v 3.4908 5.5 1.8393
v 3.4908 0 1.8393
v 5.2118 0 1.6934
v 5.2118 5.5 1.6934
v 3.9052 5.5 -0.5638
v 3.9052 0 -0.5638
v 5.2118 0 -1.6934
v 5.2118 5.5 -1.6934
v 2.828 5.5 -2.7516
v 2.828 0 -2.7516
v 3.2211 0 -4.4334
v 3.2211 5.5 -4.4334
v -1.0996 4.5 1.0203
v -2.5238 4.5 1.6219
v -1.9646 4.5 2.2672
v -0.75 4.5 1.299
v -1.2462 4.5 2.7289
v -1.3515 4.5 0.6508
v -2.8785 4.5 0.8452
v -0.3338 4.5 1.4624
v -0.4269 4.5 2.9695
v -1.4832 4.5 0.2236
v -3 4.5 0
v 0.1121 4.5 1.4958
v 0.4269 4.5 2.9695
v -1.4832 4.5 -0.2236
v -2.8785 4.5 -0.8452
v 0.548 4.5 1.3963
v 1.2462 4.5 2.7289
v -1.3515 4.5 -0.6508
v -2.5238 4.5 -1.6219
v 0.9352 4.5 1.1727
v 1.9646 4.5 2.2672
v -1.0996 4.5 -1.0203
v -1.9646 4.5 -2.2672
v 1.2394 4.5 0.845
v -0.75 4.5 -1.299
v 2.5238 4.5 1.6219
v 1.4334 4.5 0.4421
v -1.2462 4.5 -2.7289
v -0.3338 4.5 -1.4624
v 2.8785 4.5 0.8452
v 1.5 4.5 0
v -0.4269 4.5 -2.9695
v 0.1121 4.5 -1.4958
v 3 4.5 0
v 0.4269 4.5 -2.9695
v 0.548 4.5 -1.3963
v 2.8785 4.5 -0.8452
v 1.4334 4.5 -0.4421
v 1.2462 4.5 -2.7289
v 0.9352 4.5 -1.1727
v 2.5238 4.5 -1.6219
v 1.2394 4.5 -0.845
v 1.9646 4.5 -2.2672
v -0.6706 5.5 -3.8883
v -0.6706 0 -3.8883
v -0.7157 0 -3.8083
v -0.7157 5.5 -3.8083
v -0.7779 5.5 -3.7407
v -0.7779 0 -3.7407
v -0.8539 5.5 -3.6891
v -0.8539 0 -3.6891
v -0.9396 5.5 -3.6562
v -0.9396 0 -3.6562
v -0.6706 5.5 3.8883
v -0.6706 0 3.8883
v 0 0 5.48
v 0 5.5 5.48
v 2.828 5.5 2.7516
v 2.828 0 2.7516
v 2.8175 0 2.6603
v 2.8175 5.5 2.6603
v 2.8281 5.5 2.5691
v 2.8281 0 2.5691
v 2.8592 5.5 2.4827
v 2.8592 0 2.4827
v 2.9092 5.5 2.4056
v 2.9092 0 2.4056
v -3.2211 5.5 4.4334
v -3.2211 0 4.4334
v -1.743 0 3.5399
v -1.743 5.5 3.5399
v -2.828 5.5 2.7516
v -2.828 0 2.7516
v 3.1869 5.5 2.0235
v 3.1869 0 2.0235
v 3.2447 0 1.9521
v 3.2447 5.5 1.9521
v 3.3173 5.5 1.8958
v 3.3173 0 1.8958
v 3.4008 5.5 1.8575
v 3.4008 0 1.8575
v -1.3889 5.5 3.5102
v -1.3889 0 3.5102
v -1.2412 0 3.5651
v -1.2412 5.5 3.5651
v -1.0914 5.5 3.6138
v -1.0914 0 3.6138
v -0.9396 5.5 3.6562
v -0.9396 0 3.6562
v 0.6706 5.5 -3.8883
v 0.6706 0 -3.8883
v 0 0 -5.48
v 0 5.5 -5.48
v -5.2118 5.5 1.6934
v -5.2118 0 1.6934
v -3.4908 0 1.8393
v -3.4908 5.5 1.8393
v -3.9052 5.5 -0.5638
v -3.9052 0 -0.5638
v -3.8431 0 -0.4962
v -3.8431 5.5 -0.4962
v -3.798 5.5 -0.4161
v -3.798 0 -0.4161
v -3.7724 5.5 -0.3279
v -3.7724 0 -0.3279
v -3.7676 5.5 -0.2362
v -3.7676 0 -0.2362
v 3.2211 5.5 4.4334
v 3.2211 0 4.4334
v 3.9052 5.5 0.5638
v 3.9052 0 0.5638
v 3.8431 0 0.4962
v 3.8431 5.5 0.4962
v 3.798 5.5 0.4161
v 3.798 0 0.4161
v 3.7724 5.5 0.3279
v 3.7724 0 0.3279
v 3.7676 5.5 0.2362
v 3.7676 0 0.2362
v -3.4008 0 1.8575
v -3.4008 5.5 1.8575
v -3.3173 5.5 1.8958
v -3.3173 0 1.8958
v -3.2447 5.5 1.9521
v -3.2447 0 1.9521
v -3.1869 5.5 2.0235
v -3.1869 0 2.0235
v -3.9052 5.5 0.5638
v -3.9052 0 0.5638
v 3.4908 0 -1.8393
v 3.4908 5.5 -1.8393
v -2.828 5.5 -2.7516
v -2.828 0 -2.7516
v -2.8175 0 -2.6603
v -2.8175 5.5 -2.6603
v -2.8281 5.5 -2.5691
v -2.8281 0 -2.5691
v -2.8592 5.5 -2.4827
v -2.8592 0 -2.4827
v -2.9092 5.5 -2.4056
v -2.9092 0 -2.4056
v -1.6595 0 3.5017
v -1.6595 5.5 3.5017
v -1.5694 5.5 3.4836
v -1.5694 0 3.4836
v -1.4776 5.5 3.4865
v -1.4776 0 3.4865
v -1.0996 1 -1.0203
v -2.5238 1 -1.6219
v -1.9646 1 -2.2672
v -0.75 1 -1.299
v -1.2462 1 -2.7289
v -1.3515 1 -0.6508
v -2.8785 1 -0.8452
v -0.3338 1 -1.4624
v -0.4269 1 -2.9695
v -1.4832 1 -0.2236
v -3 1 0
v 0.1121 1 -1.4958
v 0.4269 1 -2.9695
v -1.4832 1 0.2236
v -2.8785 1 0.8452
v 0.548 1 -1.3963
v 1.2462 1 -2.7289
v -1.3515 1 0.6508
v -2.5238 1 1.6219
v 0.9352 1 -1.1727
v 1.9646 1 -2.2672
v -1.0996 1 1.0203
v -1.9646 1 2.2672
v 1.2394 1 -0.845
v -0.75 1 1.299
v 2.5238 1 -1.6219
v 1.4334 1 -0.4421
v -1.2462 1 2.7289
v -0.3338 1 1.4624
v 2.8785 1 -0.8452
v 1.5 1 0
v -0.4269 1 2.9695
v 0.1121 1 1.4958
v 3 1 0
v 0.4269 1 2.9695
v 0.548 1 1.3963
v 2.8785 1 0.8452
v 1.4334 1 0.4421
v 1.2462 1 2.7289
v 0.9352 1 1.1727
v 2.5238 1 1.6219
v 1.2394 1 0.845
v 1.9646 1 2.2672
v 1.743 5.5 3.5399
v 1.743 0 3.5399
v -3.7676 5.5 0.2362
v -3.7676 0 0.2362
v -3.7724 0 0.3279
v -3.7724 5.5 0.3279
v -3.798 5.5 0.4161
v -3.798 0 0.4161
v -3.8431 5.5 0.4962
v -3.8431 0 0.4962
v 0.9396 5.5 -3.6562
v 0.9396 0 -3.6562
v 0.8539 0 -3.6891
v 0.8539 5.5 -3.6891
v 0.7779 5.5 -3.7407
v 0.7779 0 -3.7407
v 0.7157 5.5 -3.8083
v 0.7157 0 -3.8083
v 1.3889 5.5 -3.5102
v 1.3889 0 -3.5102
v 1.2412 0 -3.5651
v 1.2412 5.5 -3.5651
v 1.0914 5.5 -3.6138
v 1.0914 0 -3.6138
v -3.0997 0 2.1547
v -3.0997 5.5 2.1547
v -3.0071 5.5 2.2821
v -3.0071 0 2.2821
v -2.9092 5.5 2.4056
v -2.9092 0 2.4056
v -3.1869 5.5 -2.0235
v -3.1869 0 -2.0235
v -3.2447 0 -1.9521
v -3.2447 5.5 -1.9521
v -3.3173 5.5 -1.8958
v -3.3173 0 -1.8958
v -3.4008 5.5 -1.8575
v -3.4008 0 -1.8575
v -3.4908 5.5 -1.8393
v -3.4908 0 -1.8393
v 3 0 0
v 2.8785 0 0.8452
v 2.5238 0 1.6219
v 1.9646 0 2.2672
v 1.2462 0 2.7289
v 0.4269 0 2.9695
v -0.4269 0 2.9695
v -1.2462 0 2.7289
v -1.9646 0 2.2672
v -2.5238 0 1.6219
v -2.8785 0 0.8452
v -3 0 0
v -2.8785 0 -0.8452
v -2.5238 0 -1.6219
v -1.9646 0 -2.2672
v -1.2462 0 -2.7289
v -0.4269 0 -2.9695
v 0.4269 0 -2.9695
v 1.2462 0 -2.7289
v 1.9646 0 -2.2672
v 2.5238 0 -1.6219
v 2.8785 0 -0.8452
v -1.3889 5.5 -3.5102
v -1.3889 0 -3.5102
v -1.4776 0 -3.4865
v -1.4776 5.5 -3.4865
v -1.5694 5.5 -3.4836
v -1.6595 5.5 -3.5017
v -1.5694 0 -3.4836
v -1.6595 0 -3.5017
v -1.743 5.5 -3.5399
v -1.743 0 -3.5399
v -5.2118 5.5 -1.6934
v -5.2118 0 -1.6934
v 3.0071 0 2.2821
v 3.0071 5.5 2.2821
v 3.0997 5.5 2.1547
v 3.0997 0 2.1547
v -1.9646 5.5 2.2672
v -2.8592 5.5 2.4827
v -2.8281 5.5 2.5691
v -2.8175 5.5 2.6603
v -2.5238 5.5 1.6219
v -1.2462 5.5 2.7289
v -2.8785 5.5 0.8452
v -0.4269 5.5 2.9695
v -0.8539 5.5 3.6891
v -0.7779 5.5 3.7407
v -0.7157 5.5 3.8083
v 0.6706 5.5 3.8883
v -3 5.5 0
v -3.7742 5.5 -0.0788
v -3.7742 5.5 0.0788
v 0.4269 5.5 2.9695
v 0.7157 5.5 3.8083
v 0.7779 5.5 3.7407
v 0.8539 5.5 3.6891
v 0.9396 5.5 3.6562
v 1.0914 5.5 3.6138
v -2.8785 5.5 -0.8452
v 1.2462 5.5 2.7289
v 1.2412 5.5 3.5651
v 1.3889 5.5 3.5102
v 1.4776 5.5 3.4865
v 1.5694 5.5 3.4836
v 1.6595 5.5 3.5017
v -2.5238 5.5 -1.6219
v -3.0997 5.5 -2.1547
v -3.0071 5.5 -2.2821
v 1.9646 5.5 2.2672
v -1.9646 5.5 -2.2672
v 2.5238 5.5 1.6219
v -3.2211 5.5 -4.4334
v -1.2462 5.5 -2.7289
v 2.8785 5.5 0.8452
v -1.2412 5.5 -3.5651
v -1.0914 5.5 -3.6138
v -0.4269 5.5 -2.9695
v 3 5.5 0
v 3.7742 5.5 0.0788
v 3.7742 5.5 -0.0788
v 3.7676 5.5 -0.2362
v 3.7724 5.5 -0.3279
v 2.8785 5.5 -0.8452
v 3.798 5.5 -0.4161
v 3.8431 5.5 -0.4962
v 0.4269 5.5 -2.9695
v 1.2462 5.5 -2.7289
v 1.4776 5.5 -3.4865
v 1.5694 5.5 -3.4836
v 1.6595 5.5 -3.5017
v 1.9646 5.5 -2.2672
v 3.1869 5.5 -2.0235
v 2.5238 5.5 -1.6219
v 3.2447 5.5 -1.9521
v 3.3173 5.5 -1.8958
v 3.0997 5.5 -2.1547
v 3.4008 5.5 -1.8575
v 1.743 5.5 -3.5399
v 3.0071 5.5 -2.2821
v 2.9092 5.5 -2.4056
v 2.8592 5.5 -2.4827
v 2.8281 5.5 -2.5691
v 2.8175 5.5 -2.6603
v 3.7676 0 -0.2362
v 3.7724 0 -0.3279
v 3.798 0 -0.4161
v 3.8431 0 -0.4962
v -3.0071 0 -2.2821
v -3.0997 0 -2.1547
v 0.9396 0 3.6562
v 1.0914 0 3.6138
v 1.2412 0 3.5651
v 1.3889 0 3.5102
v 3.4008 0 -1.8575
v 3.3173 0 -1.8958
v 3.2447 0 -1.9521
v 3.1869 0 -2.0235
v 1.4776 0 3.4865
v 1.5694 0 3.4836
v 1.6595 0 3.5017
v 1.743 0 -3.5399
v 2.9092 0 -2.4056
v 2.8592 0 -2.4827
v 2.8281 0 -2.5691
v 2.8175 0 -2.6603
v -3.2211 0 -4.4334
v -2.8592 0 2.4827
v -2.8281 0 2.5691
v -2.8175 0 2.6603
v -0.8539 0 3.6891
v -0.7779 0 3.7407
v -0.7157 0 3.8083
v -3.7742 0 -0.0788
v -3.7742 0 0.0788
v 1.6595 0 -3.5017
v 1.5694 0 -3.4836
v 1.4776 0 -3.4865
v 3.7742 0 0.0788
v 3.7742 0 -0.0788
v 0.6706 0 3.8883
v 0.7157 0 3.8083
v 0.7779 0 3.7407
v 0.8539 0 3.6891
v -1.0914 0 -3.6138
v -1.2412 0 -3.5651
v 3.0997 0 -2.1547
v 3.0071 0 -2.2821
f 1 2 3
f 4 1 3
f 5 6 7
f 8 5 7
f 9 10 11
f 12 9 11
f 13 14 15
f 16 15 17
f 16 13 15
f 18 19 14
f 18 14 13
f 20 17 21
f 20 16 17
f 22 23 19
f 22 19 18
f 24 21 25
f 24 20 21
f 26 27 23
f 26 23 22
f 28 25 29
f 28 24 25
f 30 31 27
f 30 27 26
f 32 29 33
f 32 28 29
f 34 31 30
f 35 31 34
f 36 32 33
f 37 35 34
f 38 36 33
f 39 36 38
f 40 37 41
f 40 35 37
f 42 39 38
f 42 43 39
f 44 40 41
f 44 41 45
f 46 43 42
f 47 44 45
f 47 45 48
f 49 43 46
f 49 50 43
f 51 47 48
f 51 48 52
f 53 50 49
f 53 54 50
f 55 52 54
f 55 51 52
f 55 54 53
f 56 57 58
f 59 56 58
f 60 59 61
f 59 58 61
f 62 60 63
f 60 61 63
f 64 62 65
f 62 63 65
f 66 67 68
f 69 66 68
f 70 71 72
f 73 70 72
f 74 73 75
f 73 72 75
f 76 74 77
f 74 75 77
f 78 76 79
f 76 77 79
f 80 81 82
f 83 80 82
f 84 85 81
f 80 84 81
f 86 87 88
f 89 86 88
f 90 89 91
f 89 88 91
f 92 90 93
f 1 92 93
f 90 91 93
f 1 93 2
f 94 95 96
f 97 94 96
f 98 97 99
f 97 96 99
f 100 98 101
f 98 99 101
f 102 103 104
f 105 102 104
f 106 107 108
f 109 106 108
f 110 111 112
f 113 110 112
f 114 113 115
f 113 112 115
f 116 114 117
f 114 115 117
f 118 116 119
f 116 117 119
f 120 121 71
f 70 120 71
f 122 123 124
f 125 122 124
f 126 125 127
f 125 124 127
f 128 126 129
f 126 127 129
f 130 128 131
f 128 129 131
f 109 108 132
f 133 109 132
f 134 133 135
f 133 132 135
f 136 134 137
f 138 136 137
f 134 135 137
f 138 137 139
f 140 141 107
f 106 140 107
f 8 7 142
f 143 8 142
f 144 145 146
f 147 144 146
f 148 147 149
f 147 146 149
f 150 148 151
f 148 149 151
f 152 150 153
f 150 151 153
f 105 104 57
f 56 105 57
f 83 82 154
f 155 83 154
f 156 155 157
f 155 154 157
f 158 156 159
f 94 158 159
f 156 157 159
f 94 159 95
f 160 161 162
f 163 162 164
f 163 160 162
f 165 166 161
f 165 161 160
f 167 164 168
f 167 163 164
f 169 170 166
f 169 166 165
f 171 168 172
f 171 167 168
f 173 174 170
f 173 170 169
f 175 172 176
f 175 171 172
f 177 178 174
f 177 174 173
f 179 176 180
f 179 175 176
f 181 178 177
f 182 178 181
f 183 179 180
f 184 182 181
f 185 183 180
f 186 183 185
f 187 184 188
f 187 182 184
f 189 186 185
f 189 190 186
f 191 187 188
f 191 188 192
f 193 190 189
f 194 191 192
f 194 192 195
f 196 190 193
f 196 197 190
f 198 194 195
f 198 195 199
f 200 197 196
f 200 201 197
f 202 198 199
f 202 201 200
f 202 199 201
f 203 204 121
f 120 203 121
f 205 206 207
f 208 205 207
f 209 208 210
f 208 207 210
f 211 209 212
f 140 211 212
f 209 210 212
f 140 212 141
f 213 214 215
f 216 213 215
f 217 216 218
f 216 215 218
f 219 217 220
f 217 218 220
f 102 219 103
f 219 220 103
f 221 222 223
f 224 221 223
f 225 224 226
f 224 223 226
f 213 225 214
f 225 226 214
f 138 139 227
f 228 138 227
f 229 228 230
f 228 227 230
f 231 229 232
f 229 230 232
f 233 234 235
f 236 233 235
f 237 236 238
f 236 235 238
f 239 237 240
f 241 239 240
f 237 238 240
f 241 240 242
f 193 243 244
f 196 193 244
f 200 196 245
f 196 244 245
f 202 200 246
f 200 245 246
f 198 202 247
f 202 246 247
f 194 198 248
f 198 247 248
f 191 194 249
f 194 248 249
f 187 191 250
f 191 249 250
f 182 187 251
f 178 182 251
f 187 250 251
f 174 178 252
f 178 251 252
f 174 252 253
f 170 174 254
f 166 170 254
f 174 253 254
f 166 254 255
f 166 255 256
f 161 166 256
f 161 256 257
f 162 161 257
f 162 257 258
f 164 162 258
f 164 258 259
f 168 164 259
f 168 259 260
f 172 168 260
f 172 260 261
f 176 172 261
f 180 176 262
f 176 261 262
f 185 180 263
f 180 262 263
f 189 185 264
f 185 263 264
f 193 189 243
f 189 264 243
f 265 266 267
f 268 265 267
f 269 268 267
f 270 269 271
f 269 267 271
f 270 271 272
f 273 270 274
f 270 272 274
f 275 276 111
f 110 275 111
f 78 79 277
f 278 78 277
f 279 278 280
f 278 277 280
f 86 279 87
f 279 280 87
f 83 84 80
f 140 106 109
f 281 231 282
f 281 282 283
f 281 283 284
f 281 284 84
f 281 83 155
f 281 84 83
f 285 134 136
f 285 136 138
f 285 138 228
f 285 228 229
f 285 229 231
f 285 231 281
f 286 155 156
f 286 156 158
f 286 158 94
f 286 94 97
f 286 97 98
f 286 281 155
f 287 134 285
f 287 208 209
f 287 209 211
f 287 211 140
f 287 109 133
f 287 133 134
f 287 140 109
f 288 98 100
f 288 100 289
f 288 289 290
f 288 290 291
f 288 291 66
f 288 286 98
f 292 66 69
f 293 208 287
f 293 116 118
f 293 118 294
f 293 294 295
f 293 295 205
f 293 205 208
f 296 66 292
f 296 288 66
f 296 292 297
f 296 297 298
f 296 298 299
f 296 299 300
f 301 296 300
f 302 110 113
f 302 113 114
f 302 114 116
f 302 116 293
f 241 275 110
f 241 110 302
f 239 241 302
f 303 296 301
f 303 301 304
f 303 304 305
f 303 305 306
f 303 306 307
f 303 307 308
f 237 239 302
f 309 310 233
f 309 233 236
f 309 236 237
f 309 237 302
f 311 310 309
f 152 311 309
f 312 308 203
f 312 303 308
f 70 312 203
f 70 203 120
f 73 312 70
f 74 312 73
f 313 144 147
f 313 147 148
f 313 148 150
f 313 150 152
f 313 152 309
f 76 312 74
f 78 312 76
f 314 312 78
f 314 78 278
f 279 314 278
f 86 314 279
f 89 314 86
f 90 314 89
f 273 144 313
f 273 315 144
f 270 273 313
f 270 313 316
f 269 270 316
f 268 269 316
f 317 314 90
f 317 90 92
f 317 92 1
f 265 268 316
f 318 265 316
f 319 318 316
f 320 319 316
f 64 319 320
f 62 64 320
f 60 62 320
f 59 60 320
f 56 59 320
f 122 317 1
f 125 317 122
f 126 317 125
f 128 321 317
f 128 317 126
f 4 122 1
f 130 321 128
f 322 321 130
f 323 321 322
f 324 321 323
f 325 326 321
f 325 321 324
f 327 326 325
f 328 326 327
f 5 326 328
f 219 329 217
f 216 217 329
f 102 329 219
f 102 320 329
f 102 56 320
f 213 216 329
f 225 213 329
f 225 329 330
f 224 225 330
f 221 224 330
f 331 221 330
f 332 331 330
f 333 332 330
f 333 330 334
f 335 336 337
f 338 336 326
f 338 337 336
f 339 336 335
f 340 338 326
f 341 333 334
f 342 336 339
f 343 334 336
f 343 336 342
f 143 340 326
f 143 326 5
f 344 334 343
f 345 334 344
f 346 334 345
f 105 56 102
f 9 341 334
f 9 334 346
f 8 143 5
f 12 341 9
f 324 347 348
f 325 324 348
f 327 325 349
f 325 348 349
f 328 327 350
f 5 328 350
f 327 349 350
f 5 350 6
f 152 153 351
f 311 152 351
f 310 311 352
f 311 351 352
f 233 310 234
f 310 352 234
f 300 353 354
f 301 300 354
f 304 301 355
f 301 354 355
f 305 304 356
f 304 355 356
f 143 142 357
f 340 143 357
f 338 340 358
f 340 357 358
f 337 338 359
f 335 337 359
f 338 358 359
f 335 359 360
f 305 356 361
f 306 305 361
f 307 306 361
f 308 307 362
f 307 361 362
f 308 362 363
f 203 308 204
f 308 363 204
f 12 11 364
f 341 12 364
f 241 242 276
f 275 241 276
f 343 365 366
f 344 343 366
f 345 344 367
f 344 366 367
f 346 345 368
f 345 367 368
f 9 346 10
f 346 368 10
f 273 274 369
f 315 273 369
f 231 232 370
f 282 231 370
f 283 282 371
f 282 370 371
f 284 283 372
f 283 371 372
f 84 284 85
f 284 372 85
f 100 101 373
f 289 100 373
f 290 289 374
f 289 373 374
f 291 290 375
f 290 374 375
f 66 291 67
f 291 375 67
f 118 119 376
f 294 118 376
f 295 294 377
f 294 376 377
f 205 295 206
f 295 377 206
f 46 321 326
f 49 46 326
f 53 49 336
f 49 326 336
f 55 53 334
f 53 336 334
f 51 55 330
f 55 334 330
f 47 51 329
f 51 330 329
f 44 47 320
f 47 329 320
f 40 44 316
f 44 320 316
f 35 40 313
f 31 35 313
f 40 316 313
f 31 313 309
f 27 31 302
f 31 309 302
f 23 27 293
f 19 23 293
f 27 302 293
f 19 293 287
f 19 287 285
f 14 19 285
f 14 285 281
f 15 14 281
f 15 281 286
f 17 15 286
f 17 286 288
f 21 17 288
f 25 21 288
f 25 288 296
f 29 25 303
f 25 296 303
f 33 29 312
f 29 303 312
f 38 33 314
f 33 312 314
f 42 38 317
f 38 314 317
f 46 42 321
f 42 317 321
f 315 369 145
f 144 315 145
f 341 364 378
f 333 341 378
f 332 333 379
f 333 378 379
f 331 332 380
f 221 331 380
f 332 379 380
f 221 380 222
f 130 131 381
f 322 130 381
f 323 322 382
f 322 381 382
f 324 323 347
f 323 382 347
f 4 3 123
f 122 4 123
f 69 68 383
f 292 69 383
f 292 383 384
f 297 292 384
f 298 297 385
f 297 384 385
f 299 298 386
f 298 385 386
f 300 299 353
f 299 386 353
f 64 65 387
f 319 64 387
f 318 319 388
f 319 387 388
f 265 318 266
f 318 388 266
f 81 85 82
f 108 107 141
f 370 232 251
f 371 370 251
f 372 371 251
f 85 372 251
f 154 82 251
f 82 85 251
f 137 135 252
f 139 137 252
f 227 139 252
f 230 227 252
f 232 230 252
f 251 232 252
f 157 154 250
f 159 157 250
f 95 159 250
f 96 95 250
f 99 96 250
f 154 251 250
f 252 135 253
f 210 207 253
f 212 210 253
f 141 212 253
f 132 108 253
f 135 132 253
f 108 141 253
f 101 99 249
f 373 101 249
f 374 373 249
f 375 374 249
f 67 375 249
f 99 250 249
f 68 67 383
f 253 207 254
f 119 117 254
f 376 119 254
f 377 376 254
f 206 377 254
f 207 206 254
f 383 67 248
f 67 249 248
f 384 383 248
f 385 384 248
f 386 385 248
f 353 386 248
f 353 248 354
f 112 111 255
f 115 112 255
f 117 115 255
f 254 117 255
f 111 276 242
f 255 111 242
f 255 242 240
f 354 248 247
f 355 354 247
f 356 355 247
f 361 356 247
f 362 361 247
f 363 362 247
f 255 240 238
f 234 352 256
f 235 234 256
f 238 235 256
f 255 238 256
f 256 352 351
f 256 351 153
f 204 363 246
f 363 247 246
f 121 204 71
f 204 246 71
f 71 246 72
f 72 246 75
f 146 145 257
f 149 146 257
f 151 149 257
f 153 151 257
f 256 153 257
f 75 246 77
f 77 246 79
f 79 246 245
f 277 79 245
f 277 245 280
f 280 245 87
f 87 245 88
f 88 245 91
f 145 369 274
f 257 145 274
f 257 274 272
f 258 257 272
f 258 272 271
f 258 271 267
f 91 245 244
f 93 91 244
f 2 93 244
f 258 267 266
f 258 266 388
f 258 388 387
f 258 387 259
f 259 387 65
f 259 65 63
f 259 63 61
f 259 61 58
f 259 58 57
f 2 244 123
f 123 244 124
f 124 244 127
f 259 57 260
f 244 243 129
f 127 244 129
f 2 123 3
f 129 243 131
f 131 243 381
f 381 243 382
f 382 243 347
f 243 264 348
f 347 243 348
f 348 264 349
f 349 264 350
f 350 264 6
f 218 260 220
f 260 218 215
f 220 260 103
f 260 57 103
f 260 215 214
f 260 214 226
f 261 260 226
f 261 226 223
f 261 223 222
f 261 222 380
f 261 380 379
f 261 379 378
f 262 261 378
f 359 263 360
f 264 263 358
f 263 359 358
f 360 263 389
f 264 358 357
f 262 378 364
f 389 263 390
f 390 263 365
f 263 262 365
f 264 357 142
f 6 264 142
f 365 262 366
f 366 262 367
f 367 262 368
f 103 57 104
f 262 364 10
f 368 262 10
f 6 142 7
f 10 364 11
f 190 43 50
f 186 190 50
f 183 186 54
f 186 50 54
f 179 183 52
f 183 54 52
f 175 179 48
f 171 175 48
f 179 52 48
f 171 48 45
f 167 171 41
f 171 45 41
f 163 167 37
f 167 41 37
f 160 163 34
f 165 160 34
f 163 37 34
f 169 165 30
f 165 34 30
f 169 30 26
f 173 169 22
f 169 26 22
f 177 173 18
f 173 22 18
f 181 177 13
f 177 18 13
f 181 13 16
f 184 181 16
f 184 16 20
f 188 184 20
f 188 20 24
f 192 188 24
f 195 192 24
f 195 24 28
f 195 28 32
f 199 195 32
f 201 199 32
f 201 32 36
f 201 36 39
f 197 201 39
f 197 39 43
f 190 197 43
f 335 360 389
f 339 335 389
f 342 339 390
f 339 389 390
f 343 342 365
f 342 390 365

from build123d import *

# Parameters (mm, degrees)
BOSS_EXTRUDE1_DEPTH = 5.5
SKETCH2_R           = 1.5
CUT_EXTRUDE2_DEPTH  = 10.351104318
SKETCH2_4_R         = 3
SKETCH2_4_R_2       = 1.5
CUT_EXTRUDE3_DEPTH  = 1
CUT_EXTRUDE4_START  = -1
SKETCH4_R           = 3
CUT_EXTRUDE4_DEPTH  = 1


with BuildPart() as part:
    # Sketch1 → Boss-Extrude1 (new body)
    with BuildSketch(Plane(origin=(0, 0, 0), x_dir=(1, 0, 0), z_dir=(0, 1, 0))):
        with BuildLine():
            Line((0, 5.48), (-0.670562296, 3.888305602))
            ThreePointArc((-0.670562296, 3.888305602), (-0.777902483, 3.74073052), (-0.939622693, 3.656191214))
            ThreePointArc((-0.939622693, 3.656191214), (-1.166539154, 3.590238349), (-1.388884548, 3.510217189))
            ThreePointArc((-1.388884548, 3.510217189), (-1.569409904, 3.483554169), (-1.742992396, 3.53985194))
            Line((-1.742992396, 3.53985194), (-3.221063183, 4.433413129))
            Line((-3.221063183, 4.433413129), (-2.827984983, 2.751558684))
            ThreePointArc((-2.827984983, 2.751558684), (-2.828082561, 2.569074955), (-2.909226002, 2.405624465))
            ThreePointArc((-2.909226002, 2.405624465), (-3.054039154, 2.218889327), (-3.186885098, 2.023459505))
            ThreePointArc((-3.186885098, 2.023459505), (-3.31726105, 1.895778528), (-3.490783235, 1.839295151))
            Line((-3.490783235, 1.839295151), (-5.211789709, 1.693413129))
            Line((-5.211789709, 1.693413129), (-3.905213526, 0.56380987))
            ThreePointArc((-3.905213526, 0.56380987), (-3.798031224, 0.416120077), (-3.76760386, 0.236190934))
            ThreePointArc((-3.76760386, 0.236190934), (-3.775, 0), (-3.76760386, -0.236190934))
            ThreePointArc((-3.76760386, -0.236190934), (-3.798031224, -0.416120077), (-3.905213526, -0.56380987))
            Line((-3.905213526, -0.56380987), (-5.211789709, -1.693413129))
            Line((-5.211789709, -1.693413129), (-3.490783235, -1.839295151))
            ThreePointArc((-3.490783235, -1.839295151), (-3.31726105, -1.895778528), (-3.186885098, -2.023459505))
            ThreePointArc((-3.186885098, -2.023459505), (-3.054039154, -2.218889327), (-2.909226002, -2.405624465))
            ThreePointArc((-2.909226002, -2.405624465), (-2.828082561, -2.569074955), (-2.827984983, -2.751558684))
            Line((-2.827984983, -2.751558684), (-3.221063183, -4.433413129))
            Line((-3.221063183, -4.433413129), (-1.742992396, -3.53985194))
            ThreePointArc((-1.742992396, -3.53985194), (-1.569409904, -3.483554169), (-1.388884548, -3.510217189))
            ThreePointArc((-1.388884548, -3.510217189), (-1.166539154, -3.590238349), (-0.939622693, -3.656191214))
            ThreePointArc((-0.939622693, -3.656191214), (-0.777902483, -3.74073052), (-0.670562296, -3.888305602))
            Line((-0.670562296, -3.888305602), (0, -5.48))
            Line((0, -5.48), (0.670562296, -3.888305602))
            ThreePointArc((0.670562296, -3.888305602), (0.777902483, -3.74073052), (0.939622693, -3.656191214))
            ThreePointArc((0.939622693, -3.656191214), (1.166539154, -3.590238349), (1.388884548, -3.510217189))
            ThreePointArc((1.388884548, -3.510217189), (1.569409904, -3.483554169), (1.742992396, -3.53985194))
            Line((1.742992396, -3.53985194), (3.221063183, -4.433413129))
            Line((3.221063183, -4.433413129), (2.827984983, -2.751558684))
            ThreePointArc((2.827984983, -2.751558684), (2.828082561, -2.569074955), (2.909226002, -2.405624465))
            ThreePointArc((2.909226002, -2.405624465), (3.054039154, -2.218889327), (3.186885098, -2.023459505))
            ThreePointArc((3.186885098, -2.023459505), (3.31726105, -1.895778528), (3.490783235, -1.839295151))
            Line((3.490783235, -1.839295151), (5.211789709, -1.693413129))
            Line((5.211789709, -1.693413129), (3.905213526, -0.56380987))
            ThreePointArc((3.905213526, -0.56380987), (3.798031224, -0.416120077), (3.76760386, -0.236190934))
            ThreePointArc((3.76760386, -0.236190934), (3.775, 0), (3.76760386, 0.236190934))
            ThreePointArc((3.76760386, 0.236190934), (3.798031224, 0.416120077), (3.905213526, 0.56380987))
            Line((3.905213526, 0.56380987), (5.211789709, 1.693413129))
            Line((5.211789709, 1.693413129), (3.490783235, 1.839295151))
            ThreePointArc((3.490783235, 1.839295151), (3.31726105, 1.895778528), (3.186885098, 2.023459505))
            ThreePointArc((3.186885098, 2.023459505), (3.054039154, 2.218889327), (2.909226002, 2.405624465))
            ThreePointArc((2.909226002, 2.405624465), (2.828082561, 2.569074955), (2.827984983, 2.751558684))
            Line((2.827984983, 2.751558684), (3.221063183, 4.433413129))
            Line((3.221063183, 4.433413129), (1.742992396, 3.53985194))
            ThreePointArc((1.742992396, 3.53985194), (1.569409904, 3.483554169), (1.388884548, 3.510217189))
            ThreePointArc((1.388884548, 3.510217189), (1.166539154, 3.590238349), (0.939622693, 3.656191214))
            ThreePointArc((0.939622693, 3.656191214), (0.777902483, 3.74073052), (0.670562296, 3.888305602))
            Line((0.670562296, 3.888305602), (0, 5.48))
        make_face()
    extrude(amount=BOSS_EXTRUDE1_DEPTH)

    # Sketch2 → Cut-Extrude2 (cut, through all)
    with BuildSketch(Plane(origin=(0, 5.5, 0), x_dir=(1, 0, 0), z_dir=(0, 1, 0))):
        Circle(SKETCH2_R)
    extrude(amount=-CUT_EXTRUDE2_DEPTH, mode=Mode.SUBTRACT)

    # Sketch2<4> → Cut-Extrude3 (cut)
    with BuildSketch(Plane(origin=(0, 5.5, 0), x_dir=(1, 0, 0), z_dir=(0, 1, 0))):
        Circle(SKETCH2_4_R)
        Circle(SKETCH2_4_R_2, mode=Mode.SUBTRACT)
    extrude(amount=-CUT_EXTRUDE3_DEPTH, mode=Mode.SUBTRACT)

    # Sketch4 → Cut-Extrude4 (cut)
    with BuildSketch(Plane.XZ.offset(CUT_EXTRUDE4_START)):
        Circle(SKETCH4_R)
    extrude(amount=CUT_EXTRUDE4_DEPTH, mode=Mode.SUBTRACT)


solid = part.part
